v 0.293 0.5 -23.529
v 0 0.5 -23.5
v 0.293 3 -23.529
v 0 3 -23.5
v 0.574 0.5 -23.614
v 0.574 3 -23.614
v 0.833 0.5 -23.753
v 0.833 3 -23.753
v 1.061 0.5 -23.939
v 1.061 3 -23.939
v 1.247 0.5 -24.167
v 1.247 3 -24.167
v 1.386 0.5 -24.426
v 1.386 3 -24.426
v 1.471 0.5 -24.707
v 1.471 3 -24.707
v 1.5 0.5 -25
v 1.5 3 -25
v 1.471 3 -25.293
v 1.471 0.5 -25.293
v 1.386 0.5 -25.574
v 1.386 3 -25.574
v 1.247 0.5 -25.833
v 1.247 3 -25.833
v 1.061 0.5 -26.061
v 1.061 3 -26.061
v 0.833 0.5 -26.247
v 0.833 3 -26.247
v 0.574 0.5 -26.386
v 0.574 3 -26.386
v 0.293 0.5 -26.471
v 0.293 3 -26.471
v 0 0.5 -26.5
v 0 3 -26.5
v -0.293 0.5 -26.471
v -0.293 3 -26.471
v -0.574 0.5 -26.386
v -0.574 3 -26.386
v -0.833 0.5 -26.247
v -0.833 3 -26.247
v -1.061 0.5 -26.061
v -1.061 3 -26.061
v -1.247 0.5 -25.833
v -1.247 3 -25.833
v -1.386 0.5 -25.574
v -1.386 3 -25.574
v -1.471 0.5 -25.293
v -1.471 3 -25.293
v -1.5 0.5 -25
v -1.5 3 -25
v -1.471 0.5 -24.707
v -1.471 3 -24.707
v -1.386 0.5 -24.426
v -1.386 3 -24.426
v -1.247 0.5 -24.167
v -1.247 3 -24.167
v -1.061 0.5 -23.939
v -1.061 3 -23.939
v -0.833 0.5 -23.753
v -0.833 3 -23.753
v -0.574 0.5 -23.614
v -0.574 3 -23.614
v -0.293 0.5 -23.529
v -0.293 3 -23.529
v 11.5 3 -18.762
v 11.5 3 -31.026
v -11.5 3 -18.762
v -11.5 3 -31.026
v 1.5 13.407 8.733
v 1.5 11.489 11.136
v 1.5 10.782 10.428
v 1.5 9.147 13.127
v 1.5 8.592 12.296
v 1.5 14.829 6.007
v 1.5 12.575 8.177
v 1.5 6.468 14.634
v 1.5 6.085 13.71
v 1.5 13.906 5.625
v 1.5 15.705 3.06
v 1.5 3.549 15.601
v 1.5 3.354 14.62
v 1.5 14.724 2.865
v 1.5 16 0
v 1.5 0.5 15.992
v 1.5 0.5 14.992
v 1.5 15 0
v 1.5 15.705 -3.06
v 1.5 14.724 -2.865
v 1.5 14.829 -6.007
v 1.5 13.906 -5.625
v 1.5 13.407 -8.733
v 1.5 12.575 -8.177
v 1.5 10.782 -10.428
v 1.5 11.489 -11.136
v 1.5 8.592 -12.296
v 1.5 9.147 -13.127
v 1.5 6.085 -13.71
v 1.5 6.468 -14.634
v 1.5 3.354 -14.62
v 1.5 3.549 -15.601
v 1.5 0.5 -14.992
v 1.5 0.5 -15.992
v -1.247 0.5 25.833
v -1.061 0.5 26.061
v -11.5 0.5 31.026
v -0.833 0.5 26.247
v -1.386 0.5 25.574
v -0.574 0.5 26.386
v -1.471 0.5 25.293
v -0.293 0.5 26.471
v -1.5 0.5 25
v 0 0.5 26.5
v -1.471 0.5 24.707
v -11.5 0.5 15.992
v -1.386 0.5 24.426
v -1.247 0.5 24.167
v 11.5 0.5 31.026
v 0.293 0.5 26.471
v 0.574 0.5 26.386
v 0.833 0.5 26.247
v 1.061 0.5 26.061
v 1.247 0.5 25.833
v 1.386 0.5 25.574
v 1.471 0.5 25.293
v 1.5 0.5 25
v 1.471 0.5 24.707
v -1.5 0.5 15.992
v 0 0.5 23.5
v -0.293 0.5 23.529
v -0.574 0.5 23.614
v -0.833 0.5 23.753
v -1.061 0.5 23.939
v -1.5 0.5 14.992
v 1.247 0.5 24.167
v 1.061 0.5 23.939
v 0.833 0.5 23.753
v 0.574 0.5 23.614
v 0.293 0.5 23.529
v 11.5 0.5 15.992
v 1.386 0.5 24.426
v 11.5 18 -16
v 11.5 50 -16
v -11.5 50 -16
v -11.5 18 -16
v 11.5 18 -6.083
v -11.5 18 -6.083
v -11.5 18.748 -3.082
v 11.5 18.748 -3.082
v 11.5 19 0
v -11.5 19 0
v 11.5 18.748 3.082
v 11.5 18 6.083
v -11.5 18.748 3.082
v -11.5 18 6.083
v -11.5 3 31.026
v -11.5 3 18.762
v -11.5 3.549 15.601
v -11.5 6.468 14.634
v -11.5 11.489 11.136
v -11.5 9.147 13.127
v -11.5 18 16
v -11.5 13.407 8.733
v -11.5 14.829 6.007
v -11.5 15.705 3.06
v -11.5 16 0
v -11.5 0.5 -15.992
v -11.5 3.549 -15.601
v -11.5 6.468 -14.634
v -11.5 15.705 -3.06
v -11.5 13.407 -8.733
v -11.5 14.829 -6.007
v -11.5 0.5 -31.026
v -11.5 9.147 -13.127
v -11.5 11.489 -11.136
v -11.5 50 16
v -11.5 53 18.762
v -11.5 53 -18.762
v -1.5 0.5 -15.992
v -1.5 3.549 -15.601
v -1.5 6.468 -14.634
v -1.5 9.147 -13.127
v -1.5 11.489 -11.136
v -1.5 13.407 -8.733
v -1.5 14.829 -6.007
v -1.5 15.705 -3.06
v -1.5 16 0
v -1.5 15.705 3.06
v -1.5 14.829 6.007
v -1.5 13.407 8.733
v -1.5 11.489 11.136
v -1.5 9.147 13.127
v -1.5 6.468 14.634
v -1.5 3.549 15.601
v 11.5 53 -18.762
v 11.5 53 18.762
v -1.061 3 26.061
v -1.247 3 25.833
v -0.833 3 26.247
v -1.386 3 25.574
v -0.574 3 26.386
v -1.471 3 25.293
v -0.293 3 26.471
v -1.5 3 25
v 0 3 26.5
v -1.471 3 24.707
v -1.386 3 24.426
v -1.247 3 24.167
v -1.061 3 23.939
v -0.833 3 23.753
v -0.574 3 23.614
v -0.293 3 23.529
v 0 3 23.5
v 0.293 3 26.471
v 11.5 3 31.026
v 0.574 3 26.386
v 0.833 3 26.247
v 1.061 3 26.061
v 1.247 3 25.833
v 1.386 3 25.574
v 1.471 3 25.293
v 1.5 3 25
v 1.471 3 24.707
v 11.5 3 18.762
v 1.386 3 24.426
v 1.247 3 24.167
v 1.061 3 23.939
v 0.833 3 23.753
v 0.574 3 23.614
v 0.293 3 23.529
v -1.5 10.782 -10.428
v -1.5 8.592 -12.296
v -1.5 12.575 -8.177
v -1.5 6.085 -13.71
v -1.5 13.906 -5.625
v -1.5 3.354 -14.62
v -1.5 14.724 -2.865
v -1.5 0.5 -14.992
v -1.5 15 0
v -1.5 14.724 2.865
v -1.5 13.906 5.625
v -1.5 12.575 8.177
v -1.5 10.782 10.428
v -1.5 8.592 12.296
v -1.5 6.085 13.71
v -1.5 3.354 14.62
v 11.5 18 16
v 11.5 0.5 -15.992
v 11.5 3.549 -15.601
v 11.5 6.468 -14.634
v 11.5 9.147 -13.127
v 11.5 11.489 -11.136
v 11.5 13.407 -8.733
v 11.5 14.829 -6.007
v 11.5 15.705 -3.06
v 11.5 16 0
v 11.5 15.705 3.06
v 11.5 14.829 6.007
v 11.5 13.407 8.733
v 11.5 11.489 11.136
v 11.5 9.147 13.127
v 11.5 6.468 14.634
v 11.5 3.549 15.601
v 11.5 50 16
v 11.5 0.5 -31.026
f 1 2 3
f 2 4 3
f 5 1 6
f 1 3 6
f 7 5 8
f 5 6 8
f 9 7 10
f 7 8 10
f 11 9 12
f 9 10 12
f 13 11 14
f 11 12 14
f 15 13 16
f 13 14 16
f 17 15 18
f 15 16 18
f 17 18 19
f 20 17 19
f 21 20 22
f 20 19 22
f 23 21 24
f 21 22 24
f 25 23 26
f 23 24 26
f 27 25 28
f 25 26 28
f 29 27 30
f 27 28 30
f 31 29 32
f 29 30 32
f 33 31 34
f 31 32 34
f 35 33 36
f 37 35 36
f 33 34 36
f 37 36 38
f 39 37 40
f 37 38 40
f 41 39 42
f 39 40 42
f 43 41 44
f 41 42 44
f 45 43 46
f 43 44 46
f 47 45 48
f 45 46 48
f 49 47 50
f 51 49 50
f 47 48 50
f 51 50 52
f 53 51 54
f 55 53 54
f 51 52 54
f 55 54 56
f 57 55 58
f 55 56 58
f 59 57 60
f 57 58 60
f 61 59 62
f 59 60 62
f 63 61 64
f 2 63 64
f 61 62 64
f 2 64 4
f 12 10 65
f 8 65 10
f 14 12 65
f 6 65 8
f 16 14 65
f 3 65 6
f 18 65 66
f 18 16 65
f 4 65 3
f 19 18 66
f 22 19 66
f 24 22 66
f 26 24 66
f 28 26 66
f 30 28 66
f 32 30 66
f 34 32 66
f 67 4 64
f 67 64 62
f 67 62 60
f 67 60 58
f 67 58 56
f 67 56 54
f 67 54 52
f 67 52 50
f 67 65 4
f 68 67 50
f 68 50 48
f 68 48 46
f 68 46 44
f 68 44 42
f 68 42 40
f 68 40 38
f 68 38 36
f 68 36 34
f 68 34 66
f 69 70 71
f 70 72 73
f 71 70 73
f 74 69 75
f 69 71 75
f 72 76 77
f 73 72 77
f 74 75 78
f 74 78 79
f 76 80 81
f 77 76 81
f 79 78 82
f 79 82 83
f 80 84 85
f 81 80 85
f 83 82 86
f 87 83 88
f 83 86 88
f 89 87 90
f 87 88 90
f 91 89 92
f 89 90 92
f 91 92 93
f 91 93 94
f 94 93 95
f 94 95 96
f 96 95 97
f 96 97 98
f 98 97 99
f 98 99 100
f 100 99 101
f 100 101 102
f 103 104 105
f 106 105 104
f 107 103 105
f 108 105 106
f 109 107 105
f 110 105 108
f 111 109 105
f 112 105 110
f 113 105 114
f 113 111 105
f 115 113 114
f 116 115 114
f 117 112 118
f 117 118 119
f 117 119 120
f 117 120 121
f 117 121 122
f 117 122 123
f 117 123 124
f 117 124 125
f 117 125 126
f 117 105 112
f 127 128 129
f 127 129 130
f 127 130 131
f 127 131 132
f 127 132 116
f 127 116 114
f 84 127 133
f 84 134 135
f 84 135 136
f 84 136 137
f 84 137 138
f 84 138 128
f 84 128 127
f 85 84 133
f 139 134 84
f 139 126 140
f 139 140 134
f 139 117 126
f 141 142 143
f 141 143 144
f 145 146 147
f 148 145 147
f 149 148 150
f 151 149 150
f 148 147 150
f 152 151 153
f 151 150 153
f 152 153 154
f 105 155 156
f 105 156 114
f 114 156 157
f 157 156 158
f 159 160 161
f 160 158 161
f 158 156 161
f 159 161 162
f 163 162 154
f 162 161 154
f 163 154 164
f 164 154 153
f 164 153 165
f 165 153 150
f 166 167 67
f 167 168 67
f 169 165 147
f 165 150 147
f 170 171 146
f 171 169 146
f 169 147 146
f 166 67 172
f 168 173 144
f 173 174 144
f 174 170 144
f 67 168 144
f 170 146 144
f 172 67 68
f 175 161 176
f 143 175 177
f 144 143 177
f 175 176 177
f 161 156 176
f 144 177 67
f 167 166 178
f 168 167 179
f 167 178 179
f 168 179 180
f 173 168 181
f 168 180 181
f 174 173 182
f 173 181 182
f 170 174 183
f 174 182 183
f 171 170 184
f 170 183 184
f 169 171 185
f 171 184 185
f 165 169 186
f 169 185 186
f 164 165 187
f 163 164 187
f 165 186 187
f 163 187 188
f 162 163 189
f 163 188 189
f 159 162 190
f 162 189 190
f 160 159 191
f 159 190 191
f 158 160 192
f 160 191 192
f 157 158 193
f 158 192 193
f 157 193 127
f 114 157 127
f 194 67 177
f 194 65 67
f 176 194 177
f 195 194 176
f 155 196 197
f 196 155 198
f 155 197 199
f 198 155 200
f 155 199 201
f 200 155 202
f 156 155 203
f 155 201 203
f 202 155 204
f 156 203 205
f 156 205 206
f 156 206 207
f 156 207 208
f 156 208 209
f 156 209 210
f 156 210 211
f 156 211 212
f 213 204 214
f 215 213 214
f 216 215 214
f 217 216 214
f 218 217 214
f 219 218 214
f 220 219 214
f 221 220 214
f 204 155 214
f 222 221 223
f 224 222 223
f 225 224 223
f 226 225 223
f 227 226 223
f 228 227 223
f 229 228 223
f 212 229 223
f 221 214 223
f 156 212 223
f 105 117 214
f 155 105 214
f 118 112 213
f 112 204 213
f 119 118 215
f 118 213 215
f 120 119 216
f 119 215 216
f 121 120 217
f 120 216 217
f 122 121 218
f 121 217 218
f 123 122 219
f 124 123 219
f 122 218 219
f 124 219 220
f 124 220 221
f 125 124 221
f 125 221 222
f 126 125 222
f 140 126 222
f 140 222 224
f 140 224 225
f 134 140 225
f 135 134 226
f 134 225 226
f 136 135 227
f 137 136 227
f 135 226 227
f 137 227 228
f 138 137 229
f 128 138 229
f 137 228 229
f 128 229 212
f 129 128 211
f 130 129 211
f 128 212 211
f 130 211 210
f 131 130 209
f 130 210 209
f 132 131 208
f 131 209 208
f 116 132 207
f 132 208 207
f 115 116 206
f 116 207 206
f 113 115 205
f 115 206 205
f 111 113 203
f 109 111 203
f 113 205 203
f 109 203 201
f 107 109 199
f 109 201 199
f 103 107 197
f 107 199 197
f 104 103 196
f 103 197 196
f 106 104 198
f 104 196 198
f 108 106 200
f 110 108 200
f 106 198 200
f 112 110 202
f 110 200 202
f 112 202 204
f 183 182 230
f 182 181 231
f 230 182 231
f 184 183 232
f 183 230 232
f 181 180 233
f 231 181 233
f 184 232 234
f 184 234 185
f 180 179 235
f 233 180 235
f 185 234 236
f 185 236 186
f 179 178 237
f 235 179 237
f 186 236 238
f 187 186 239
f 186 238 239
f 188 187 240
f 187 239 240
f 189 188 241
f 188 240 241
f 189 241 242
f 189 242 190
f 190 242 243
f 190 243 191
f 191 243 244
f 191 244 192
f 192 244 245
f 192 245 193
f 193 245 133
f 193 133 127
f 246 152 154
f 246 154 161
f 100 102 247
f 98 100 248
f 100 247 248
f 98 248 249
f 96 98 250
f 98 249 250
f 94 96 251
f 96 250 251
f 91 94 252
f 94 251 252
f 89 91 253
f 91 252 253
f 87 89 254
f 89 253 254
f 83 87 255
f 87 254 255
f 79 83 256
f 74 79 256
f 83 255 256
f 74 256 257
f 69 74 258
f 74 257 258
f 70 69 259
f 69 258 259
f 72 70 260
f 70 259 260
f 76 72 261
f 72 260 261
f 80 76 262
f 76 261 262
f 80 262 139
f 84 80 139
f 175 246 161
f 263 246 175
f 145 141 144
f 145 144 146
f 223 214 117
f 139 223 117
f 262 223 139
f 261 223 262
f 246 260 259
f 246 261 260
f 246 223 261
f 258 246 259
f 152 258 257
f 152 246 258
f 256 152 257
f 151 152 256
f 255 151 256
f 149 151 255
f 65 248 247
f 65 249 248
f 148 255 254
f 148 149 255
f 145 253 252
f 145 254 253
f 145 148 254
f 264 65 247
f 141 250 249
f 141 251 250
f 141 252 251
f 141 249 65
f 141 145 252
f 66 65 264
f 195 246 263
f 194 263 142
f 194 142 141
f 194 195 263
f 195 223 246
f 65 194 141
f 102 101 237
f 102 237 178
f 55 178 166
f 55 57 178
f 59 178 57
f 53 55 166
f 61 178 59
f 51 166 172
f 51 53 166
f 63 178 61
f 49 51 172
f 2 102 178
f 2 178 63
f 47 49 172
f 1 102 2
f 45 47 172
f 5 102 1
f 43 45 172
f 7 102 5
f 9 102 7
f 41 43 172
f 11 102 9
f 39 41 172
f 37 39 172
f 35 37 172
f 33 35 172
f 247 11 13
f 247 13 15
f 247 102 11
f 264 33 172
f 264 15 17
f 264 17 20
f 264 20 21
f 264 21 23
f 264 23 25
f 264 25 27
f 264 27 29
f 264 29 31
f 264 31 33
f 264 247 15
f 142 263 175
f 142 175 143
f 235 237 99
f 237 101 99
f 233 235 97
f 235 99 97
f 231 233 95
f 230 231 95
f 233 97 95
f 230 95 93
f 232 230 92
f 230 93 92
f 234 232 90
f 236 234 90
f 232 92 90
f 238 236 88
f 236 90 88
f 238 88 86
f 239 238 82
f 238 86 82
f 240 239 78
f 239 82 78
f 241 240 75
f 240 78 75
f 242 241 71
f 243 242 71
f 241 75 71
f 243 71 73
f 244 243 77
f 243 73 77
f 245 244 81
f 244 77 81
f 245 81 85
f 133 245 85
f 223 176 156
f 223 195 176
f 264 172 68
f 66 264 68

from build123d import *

# Parameters (mm, degrees)
SKETCH3_W           = 13.566130208
SKETCH3_H           = 6
BOSS_EXTRUDE1_DEPTH = 11.5
SKETCH4_R           = 1.5
CUT_EXTRUDE1_DEPTH  = 11.5
SKETCH5_W           = 75.75040558
SKETCH5_H           = 1
CUT_EXTRUDE2_DEPTH  = 26
BOSS_EXTRUDE2_DEPTH = 11.5


with BuildPart() as part:
    # Sketch2 → Revolve1 (revolve)
    with BuildSketch(Plane(origin=(0, 0, 0), x_dir=(1, 0, 0), z_dir=(0, 1, 0)), mode=Mode.PRIVATE) as revolve1_sk:
        Polygon((-11.5, 16), (-1.5, 16), (-1.5, 15), (1.5, 15), (1.5, 16), (11.5, 16), (11.5, 19), (-11.5, 19), align=None)
    revolve(revolve1_sk.sketch.rotate(Axis((-71.722155375, 0, 0), (1, 0, 0)), 180), axis=Axis((-71.722155375, 0, 0), (1, 0, 0)))

    # Sketch3 → Boss-Extrude1 (add, symmetric)
    with BuildSketch(Plane(origin=(0, 0, 0), x_dir=(0, 0, -1), z_dir=(1, 0, 0))):
        with Locations((24.243185686, 0)):
            Rectangle(SKETCH3_W, SKETCH3_H)
        with Locations((-24.243185686, 0)):
            Rectangle(SKETCH3_W, SKETCH3_H)
    extrude(amount=BOSS_EXTRUDE1_DEPTH, both=True)

    # Sketch4 → Cut-Extrude1 (cut, symmetric)
    with BuildSketch(Plane(origin=(0, 0, 0), x_dir=(1, 0, 0), z_dir=(0, 1, 0))):
        with Locations(Location((0, 25, 0), (0, 0, 270))):
            Circle(SKETCH4_R)
        with Locations(Location((0, -25, 0), (0, 0, 270))):
            Circle(SKETCH4_R)
    extrude(amount=CUT_EXTRUDE1_DEPTH, both=True, mode=Mode.SUBTRACT)

    # Sketch5 → Cut-Extrude2 (cut, symmetric)
    with BuildSketch(Plane(origin=(0, 0, 0), x_dir=(0, 0, -1), z_dir=(1, 0, 0))):
        Rectangle(SKETCH5_W, SKETCH5_H)
    extrude(amount=CUT_EXTRUDE2_DEPTH, both=True, mode=Mode.SUBTRACT)


with BuildPart() as cut_extrude2_piece_1:
    # of the separate pieces the step leaves, piece 1, a body of its own (cut_extrude2_pieces)
    add(part.part.solids().sort_by_distance((-11.5, 0.5, -15.992185592))[0])

    # Sketch7 → Boss-Extrude2 (add, symmetric)
    with BuildSketch(Plane(origin=(0, 0, 0), x_dir=(0, 0, -1), z_dir=(1, 0, 0))):
        with BuildLine():
            Line((-18.761663039, 53), (-18.761663039, 3))
            ThreePointArc((-18.761663039, 3), (-14.510732941, 12.265342618), (-6.08276253, 18))
            Line((-6.08276253, 18), (-16, 18))
            Line((-16, 18), (-16, 50))
            Line((-16, 50), (16, 50))
            Line((16, 50), (16, 18))
            Line((16, 18), (6.08276253, 18))
            ThreePointArc((6.08276253, 18), (14.510732941, 12.265342618), (18.761663039, 3))
            Line((18.761663039, 3), (18.761663039, 53))
            Line((18.761663039, 53), (-18.761663039, 53))
        make_face()
    extrude(amount=BOSS_EXTRUDE2_DEPTH, both=True)


with BuildPart() as cut_extrude2_piece_2:
    # of the separate pieces the step leaves, piece 2, a body of its own (cut_extrude2_pieces)
    add(part.part.solids().sort_by_distance((-11.5, -0.5, 15.992185592))[0])


solid = cut_extrude2_piece_1.part
